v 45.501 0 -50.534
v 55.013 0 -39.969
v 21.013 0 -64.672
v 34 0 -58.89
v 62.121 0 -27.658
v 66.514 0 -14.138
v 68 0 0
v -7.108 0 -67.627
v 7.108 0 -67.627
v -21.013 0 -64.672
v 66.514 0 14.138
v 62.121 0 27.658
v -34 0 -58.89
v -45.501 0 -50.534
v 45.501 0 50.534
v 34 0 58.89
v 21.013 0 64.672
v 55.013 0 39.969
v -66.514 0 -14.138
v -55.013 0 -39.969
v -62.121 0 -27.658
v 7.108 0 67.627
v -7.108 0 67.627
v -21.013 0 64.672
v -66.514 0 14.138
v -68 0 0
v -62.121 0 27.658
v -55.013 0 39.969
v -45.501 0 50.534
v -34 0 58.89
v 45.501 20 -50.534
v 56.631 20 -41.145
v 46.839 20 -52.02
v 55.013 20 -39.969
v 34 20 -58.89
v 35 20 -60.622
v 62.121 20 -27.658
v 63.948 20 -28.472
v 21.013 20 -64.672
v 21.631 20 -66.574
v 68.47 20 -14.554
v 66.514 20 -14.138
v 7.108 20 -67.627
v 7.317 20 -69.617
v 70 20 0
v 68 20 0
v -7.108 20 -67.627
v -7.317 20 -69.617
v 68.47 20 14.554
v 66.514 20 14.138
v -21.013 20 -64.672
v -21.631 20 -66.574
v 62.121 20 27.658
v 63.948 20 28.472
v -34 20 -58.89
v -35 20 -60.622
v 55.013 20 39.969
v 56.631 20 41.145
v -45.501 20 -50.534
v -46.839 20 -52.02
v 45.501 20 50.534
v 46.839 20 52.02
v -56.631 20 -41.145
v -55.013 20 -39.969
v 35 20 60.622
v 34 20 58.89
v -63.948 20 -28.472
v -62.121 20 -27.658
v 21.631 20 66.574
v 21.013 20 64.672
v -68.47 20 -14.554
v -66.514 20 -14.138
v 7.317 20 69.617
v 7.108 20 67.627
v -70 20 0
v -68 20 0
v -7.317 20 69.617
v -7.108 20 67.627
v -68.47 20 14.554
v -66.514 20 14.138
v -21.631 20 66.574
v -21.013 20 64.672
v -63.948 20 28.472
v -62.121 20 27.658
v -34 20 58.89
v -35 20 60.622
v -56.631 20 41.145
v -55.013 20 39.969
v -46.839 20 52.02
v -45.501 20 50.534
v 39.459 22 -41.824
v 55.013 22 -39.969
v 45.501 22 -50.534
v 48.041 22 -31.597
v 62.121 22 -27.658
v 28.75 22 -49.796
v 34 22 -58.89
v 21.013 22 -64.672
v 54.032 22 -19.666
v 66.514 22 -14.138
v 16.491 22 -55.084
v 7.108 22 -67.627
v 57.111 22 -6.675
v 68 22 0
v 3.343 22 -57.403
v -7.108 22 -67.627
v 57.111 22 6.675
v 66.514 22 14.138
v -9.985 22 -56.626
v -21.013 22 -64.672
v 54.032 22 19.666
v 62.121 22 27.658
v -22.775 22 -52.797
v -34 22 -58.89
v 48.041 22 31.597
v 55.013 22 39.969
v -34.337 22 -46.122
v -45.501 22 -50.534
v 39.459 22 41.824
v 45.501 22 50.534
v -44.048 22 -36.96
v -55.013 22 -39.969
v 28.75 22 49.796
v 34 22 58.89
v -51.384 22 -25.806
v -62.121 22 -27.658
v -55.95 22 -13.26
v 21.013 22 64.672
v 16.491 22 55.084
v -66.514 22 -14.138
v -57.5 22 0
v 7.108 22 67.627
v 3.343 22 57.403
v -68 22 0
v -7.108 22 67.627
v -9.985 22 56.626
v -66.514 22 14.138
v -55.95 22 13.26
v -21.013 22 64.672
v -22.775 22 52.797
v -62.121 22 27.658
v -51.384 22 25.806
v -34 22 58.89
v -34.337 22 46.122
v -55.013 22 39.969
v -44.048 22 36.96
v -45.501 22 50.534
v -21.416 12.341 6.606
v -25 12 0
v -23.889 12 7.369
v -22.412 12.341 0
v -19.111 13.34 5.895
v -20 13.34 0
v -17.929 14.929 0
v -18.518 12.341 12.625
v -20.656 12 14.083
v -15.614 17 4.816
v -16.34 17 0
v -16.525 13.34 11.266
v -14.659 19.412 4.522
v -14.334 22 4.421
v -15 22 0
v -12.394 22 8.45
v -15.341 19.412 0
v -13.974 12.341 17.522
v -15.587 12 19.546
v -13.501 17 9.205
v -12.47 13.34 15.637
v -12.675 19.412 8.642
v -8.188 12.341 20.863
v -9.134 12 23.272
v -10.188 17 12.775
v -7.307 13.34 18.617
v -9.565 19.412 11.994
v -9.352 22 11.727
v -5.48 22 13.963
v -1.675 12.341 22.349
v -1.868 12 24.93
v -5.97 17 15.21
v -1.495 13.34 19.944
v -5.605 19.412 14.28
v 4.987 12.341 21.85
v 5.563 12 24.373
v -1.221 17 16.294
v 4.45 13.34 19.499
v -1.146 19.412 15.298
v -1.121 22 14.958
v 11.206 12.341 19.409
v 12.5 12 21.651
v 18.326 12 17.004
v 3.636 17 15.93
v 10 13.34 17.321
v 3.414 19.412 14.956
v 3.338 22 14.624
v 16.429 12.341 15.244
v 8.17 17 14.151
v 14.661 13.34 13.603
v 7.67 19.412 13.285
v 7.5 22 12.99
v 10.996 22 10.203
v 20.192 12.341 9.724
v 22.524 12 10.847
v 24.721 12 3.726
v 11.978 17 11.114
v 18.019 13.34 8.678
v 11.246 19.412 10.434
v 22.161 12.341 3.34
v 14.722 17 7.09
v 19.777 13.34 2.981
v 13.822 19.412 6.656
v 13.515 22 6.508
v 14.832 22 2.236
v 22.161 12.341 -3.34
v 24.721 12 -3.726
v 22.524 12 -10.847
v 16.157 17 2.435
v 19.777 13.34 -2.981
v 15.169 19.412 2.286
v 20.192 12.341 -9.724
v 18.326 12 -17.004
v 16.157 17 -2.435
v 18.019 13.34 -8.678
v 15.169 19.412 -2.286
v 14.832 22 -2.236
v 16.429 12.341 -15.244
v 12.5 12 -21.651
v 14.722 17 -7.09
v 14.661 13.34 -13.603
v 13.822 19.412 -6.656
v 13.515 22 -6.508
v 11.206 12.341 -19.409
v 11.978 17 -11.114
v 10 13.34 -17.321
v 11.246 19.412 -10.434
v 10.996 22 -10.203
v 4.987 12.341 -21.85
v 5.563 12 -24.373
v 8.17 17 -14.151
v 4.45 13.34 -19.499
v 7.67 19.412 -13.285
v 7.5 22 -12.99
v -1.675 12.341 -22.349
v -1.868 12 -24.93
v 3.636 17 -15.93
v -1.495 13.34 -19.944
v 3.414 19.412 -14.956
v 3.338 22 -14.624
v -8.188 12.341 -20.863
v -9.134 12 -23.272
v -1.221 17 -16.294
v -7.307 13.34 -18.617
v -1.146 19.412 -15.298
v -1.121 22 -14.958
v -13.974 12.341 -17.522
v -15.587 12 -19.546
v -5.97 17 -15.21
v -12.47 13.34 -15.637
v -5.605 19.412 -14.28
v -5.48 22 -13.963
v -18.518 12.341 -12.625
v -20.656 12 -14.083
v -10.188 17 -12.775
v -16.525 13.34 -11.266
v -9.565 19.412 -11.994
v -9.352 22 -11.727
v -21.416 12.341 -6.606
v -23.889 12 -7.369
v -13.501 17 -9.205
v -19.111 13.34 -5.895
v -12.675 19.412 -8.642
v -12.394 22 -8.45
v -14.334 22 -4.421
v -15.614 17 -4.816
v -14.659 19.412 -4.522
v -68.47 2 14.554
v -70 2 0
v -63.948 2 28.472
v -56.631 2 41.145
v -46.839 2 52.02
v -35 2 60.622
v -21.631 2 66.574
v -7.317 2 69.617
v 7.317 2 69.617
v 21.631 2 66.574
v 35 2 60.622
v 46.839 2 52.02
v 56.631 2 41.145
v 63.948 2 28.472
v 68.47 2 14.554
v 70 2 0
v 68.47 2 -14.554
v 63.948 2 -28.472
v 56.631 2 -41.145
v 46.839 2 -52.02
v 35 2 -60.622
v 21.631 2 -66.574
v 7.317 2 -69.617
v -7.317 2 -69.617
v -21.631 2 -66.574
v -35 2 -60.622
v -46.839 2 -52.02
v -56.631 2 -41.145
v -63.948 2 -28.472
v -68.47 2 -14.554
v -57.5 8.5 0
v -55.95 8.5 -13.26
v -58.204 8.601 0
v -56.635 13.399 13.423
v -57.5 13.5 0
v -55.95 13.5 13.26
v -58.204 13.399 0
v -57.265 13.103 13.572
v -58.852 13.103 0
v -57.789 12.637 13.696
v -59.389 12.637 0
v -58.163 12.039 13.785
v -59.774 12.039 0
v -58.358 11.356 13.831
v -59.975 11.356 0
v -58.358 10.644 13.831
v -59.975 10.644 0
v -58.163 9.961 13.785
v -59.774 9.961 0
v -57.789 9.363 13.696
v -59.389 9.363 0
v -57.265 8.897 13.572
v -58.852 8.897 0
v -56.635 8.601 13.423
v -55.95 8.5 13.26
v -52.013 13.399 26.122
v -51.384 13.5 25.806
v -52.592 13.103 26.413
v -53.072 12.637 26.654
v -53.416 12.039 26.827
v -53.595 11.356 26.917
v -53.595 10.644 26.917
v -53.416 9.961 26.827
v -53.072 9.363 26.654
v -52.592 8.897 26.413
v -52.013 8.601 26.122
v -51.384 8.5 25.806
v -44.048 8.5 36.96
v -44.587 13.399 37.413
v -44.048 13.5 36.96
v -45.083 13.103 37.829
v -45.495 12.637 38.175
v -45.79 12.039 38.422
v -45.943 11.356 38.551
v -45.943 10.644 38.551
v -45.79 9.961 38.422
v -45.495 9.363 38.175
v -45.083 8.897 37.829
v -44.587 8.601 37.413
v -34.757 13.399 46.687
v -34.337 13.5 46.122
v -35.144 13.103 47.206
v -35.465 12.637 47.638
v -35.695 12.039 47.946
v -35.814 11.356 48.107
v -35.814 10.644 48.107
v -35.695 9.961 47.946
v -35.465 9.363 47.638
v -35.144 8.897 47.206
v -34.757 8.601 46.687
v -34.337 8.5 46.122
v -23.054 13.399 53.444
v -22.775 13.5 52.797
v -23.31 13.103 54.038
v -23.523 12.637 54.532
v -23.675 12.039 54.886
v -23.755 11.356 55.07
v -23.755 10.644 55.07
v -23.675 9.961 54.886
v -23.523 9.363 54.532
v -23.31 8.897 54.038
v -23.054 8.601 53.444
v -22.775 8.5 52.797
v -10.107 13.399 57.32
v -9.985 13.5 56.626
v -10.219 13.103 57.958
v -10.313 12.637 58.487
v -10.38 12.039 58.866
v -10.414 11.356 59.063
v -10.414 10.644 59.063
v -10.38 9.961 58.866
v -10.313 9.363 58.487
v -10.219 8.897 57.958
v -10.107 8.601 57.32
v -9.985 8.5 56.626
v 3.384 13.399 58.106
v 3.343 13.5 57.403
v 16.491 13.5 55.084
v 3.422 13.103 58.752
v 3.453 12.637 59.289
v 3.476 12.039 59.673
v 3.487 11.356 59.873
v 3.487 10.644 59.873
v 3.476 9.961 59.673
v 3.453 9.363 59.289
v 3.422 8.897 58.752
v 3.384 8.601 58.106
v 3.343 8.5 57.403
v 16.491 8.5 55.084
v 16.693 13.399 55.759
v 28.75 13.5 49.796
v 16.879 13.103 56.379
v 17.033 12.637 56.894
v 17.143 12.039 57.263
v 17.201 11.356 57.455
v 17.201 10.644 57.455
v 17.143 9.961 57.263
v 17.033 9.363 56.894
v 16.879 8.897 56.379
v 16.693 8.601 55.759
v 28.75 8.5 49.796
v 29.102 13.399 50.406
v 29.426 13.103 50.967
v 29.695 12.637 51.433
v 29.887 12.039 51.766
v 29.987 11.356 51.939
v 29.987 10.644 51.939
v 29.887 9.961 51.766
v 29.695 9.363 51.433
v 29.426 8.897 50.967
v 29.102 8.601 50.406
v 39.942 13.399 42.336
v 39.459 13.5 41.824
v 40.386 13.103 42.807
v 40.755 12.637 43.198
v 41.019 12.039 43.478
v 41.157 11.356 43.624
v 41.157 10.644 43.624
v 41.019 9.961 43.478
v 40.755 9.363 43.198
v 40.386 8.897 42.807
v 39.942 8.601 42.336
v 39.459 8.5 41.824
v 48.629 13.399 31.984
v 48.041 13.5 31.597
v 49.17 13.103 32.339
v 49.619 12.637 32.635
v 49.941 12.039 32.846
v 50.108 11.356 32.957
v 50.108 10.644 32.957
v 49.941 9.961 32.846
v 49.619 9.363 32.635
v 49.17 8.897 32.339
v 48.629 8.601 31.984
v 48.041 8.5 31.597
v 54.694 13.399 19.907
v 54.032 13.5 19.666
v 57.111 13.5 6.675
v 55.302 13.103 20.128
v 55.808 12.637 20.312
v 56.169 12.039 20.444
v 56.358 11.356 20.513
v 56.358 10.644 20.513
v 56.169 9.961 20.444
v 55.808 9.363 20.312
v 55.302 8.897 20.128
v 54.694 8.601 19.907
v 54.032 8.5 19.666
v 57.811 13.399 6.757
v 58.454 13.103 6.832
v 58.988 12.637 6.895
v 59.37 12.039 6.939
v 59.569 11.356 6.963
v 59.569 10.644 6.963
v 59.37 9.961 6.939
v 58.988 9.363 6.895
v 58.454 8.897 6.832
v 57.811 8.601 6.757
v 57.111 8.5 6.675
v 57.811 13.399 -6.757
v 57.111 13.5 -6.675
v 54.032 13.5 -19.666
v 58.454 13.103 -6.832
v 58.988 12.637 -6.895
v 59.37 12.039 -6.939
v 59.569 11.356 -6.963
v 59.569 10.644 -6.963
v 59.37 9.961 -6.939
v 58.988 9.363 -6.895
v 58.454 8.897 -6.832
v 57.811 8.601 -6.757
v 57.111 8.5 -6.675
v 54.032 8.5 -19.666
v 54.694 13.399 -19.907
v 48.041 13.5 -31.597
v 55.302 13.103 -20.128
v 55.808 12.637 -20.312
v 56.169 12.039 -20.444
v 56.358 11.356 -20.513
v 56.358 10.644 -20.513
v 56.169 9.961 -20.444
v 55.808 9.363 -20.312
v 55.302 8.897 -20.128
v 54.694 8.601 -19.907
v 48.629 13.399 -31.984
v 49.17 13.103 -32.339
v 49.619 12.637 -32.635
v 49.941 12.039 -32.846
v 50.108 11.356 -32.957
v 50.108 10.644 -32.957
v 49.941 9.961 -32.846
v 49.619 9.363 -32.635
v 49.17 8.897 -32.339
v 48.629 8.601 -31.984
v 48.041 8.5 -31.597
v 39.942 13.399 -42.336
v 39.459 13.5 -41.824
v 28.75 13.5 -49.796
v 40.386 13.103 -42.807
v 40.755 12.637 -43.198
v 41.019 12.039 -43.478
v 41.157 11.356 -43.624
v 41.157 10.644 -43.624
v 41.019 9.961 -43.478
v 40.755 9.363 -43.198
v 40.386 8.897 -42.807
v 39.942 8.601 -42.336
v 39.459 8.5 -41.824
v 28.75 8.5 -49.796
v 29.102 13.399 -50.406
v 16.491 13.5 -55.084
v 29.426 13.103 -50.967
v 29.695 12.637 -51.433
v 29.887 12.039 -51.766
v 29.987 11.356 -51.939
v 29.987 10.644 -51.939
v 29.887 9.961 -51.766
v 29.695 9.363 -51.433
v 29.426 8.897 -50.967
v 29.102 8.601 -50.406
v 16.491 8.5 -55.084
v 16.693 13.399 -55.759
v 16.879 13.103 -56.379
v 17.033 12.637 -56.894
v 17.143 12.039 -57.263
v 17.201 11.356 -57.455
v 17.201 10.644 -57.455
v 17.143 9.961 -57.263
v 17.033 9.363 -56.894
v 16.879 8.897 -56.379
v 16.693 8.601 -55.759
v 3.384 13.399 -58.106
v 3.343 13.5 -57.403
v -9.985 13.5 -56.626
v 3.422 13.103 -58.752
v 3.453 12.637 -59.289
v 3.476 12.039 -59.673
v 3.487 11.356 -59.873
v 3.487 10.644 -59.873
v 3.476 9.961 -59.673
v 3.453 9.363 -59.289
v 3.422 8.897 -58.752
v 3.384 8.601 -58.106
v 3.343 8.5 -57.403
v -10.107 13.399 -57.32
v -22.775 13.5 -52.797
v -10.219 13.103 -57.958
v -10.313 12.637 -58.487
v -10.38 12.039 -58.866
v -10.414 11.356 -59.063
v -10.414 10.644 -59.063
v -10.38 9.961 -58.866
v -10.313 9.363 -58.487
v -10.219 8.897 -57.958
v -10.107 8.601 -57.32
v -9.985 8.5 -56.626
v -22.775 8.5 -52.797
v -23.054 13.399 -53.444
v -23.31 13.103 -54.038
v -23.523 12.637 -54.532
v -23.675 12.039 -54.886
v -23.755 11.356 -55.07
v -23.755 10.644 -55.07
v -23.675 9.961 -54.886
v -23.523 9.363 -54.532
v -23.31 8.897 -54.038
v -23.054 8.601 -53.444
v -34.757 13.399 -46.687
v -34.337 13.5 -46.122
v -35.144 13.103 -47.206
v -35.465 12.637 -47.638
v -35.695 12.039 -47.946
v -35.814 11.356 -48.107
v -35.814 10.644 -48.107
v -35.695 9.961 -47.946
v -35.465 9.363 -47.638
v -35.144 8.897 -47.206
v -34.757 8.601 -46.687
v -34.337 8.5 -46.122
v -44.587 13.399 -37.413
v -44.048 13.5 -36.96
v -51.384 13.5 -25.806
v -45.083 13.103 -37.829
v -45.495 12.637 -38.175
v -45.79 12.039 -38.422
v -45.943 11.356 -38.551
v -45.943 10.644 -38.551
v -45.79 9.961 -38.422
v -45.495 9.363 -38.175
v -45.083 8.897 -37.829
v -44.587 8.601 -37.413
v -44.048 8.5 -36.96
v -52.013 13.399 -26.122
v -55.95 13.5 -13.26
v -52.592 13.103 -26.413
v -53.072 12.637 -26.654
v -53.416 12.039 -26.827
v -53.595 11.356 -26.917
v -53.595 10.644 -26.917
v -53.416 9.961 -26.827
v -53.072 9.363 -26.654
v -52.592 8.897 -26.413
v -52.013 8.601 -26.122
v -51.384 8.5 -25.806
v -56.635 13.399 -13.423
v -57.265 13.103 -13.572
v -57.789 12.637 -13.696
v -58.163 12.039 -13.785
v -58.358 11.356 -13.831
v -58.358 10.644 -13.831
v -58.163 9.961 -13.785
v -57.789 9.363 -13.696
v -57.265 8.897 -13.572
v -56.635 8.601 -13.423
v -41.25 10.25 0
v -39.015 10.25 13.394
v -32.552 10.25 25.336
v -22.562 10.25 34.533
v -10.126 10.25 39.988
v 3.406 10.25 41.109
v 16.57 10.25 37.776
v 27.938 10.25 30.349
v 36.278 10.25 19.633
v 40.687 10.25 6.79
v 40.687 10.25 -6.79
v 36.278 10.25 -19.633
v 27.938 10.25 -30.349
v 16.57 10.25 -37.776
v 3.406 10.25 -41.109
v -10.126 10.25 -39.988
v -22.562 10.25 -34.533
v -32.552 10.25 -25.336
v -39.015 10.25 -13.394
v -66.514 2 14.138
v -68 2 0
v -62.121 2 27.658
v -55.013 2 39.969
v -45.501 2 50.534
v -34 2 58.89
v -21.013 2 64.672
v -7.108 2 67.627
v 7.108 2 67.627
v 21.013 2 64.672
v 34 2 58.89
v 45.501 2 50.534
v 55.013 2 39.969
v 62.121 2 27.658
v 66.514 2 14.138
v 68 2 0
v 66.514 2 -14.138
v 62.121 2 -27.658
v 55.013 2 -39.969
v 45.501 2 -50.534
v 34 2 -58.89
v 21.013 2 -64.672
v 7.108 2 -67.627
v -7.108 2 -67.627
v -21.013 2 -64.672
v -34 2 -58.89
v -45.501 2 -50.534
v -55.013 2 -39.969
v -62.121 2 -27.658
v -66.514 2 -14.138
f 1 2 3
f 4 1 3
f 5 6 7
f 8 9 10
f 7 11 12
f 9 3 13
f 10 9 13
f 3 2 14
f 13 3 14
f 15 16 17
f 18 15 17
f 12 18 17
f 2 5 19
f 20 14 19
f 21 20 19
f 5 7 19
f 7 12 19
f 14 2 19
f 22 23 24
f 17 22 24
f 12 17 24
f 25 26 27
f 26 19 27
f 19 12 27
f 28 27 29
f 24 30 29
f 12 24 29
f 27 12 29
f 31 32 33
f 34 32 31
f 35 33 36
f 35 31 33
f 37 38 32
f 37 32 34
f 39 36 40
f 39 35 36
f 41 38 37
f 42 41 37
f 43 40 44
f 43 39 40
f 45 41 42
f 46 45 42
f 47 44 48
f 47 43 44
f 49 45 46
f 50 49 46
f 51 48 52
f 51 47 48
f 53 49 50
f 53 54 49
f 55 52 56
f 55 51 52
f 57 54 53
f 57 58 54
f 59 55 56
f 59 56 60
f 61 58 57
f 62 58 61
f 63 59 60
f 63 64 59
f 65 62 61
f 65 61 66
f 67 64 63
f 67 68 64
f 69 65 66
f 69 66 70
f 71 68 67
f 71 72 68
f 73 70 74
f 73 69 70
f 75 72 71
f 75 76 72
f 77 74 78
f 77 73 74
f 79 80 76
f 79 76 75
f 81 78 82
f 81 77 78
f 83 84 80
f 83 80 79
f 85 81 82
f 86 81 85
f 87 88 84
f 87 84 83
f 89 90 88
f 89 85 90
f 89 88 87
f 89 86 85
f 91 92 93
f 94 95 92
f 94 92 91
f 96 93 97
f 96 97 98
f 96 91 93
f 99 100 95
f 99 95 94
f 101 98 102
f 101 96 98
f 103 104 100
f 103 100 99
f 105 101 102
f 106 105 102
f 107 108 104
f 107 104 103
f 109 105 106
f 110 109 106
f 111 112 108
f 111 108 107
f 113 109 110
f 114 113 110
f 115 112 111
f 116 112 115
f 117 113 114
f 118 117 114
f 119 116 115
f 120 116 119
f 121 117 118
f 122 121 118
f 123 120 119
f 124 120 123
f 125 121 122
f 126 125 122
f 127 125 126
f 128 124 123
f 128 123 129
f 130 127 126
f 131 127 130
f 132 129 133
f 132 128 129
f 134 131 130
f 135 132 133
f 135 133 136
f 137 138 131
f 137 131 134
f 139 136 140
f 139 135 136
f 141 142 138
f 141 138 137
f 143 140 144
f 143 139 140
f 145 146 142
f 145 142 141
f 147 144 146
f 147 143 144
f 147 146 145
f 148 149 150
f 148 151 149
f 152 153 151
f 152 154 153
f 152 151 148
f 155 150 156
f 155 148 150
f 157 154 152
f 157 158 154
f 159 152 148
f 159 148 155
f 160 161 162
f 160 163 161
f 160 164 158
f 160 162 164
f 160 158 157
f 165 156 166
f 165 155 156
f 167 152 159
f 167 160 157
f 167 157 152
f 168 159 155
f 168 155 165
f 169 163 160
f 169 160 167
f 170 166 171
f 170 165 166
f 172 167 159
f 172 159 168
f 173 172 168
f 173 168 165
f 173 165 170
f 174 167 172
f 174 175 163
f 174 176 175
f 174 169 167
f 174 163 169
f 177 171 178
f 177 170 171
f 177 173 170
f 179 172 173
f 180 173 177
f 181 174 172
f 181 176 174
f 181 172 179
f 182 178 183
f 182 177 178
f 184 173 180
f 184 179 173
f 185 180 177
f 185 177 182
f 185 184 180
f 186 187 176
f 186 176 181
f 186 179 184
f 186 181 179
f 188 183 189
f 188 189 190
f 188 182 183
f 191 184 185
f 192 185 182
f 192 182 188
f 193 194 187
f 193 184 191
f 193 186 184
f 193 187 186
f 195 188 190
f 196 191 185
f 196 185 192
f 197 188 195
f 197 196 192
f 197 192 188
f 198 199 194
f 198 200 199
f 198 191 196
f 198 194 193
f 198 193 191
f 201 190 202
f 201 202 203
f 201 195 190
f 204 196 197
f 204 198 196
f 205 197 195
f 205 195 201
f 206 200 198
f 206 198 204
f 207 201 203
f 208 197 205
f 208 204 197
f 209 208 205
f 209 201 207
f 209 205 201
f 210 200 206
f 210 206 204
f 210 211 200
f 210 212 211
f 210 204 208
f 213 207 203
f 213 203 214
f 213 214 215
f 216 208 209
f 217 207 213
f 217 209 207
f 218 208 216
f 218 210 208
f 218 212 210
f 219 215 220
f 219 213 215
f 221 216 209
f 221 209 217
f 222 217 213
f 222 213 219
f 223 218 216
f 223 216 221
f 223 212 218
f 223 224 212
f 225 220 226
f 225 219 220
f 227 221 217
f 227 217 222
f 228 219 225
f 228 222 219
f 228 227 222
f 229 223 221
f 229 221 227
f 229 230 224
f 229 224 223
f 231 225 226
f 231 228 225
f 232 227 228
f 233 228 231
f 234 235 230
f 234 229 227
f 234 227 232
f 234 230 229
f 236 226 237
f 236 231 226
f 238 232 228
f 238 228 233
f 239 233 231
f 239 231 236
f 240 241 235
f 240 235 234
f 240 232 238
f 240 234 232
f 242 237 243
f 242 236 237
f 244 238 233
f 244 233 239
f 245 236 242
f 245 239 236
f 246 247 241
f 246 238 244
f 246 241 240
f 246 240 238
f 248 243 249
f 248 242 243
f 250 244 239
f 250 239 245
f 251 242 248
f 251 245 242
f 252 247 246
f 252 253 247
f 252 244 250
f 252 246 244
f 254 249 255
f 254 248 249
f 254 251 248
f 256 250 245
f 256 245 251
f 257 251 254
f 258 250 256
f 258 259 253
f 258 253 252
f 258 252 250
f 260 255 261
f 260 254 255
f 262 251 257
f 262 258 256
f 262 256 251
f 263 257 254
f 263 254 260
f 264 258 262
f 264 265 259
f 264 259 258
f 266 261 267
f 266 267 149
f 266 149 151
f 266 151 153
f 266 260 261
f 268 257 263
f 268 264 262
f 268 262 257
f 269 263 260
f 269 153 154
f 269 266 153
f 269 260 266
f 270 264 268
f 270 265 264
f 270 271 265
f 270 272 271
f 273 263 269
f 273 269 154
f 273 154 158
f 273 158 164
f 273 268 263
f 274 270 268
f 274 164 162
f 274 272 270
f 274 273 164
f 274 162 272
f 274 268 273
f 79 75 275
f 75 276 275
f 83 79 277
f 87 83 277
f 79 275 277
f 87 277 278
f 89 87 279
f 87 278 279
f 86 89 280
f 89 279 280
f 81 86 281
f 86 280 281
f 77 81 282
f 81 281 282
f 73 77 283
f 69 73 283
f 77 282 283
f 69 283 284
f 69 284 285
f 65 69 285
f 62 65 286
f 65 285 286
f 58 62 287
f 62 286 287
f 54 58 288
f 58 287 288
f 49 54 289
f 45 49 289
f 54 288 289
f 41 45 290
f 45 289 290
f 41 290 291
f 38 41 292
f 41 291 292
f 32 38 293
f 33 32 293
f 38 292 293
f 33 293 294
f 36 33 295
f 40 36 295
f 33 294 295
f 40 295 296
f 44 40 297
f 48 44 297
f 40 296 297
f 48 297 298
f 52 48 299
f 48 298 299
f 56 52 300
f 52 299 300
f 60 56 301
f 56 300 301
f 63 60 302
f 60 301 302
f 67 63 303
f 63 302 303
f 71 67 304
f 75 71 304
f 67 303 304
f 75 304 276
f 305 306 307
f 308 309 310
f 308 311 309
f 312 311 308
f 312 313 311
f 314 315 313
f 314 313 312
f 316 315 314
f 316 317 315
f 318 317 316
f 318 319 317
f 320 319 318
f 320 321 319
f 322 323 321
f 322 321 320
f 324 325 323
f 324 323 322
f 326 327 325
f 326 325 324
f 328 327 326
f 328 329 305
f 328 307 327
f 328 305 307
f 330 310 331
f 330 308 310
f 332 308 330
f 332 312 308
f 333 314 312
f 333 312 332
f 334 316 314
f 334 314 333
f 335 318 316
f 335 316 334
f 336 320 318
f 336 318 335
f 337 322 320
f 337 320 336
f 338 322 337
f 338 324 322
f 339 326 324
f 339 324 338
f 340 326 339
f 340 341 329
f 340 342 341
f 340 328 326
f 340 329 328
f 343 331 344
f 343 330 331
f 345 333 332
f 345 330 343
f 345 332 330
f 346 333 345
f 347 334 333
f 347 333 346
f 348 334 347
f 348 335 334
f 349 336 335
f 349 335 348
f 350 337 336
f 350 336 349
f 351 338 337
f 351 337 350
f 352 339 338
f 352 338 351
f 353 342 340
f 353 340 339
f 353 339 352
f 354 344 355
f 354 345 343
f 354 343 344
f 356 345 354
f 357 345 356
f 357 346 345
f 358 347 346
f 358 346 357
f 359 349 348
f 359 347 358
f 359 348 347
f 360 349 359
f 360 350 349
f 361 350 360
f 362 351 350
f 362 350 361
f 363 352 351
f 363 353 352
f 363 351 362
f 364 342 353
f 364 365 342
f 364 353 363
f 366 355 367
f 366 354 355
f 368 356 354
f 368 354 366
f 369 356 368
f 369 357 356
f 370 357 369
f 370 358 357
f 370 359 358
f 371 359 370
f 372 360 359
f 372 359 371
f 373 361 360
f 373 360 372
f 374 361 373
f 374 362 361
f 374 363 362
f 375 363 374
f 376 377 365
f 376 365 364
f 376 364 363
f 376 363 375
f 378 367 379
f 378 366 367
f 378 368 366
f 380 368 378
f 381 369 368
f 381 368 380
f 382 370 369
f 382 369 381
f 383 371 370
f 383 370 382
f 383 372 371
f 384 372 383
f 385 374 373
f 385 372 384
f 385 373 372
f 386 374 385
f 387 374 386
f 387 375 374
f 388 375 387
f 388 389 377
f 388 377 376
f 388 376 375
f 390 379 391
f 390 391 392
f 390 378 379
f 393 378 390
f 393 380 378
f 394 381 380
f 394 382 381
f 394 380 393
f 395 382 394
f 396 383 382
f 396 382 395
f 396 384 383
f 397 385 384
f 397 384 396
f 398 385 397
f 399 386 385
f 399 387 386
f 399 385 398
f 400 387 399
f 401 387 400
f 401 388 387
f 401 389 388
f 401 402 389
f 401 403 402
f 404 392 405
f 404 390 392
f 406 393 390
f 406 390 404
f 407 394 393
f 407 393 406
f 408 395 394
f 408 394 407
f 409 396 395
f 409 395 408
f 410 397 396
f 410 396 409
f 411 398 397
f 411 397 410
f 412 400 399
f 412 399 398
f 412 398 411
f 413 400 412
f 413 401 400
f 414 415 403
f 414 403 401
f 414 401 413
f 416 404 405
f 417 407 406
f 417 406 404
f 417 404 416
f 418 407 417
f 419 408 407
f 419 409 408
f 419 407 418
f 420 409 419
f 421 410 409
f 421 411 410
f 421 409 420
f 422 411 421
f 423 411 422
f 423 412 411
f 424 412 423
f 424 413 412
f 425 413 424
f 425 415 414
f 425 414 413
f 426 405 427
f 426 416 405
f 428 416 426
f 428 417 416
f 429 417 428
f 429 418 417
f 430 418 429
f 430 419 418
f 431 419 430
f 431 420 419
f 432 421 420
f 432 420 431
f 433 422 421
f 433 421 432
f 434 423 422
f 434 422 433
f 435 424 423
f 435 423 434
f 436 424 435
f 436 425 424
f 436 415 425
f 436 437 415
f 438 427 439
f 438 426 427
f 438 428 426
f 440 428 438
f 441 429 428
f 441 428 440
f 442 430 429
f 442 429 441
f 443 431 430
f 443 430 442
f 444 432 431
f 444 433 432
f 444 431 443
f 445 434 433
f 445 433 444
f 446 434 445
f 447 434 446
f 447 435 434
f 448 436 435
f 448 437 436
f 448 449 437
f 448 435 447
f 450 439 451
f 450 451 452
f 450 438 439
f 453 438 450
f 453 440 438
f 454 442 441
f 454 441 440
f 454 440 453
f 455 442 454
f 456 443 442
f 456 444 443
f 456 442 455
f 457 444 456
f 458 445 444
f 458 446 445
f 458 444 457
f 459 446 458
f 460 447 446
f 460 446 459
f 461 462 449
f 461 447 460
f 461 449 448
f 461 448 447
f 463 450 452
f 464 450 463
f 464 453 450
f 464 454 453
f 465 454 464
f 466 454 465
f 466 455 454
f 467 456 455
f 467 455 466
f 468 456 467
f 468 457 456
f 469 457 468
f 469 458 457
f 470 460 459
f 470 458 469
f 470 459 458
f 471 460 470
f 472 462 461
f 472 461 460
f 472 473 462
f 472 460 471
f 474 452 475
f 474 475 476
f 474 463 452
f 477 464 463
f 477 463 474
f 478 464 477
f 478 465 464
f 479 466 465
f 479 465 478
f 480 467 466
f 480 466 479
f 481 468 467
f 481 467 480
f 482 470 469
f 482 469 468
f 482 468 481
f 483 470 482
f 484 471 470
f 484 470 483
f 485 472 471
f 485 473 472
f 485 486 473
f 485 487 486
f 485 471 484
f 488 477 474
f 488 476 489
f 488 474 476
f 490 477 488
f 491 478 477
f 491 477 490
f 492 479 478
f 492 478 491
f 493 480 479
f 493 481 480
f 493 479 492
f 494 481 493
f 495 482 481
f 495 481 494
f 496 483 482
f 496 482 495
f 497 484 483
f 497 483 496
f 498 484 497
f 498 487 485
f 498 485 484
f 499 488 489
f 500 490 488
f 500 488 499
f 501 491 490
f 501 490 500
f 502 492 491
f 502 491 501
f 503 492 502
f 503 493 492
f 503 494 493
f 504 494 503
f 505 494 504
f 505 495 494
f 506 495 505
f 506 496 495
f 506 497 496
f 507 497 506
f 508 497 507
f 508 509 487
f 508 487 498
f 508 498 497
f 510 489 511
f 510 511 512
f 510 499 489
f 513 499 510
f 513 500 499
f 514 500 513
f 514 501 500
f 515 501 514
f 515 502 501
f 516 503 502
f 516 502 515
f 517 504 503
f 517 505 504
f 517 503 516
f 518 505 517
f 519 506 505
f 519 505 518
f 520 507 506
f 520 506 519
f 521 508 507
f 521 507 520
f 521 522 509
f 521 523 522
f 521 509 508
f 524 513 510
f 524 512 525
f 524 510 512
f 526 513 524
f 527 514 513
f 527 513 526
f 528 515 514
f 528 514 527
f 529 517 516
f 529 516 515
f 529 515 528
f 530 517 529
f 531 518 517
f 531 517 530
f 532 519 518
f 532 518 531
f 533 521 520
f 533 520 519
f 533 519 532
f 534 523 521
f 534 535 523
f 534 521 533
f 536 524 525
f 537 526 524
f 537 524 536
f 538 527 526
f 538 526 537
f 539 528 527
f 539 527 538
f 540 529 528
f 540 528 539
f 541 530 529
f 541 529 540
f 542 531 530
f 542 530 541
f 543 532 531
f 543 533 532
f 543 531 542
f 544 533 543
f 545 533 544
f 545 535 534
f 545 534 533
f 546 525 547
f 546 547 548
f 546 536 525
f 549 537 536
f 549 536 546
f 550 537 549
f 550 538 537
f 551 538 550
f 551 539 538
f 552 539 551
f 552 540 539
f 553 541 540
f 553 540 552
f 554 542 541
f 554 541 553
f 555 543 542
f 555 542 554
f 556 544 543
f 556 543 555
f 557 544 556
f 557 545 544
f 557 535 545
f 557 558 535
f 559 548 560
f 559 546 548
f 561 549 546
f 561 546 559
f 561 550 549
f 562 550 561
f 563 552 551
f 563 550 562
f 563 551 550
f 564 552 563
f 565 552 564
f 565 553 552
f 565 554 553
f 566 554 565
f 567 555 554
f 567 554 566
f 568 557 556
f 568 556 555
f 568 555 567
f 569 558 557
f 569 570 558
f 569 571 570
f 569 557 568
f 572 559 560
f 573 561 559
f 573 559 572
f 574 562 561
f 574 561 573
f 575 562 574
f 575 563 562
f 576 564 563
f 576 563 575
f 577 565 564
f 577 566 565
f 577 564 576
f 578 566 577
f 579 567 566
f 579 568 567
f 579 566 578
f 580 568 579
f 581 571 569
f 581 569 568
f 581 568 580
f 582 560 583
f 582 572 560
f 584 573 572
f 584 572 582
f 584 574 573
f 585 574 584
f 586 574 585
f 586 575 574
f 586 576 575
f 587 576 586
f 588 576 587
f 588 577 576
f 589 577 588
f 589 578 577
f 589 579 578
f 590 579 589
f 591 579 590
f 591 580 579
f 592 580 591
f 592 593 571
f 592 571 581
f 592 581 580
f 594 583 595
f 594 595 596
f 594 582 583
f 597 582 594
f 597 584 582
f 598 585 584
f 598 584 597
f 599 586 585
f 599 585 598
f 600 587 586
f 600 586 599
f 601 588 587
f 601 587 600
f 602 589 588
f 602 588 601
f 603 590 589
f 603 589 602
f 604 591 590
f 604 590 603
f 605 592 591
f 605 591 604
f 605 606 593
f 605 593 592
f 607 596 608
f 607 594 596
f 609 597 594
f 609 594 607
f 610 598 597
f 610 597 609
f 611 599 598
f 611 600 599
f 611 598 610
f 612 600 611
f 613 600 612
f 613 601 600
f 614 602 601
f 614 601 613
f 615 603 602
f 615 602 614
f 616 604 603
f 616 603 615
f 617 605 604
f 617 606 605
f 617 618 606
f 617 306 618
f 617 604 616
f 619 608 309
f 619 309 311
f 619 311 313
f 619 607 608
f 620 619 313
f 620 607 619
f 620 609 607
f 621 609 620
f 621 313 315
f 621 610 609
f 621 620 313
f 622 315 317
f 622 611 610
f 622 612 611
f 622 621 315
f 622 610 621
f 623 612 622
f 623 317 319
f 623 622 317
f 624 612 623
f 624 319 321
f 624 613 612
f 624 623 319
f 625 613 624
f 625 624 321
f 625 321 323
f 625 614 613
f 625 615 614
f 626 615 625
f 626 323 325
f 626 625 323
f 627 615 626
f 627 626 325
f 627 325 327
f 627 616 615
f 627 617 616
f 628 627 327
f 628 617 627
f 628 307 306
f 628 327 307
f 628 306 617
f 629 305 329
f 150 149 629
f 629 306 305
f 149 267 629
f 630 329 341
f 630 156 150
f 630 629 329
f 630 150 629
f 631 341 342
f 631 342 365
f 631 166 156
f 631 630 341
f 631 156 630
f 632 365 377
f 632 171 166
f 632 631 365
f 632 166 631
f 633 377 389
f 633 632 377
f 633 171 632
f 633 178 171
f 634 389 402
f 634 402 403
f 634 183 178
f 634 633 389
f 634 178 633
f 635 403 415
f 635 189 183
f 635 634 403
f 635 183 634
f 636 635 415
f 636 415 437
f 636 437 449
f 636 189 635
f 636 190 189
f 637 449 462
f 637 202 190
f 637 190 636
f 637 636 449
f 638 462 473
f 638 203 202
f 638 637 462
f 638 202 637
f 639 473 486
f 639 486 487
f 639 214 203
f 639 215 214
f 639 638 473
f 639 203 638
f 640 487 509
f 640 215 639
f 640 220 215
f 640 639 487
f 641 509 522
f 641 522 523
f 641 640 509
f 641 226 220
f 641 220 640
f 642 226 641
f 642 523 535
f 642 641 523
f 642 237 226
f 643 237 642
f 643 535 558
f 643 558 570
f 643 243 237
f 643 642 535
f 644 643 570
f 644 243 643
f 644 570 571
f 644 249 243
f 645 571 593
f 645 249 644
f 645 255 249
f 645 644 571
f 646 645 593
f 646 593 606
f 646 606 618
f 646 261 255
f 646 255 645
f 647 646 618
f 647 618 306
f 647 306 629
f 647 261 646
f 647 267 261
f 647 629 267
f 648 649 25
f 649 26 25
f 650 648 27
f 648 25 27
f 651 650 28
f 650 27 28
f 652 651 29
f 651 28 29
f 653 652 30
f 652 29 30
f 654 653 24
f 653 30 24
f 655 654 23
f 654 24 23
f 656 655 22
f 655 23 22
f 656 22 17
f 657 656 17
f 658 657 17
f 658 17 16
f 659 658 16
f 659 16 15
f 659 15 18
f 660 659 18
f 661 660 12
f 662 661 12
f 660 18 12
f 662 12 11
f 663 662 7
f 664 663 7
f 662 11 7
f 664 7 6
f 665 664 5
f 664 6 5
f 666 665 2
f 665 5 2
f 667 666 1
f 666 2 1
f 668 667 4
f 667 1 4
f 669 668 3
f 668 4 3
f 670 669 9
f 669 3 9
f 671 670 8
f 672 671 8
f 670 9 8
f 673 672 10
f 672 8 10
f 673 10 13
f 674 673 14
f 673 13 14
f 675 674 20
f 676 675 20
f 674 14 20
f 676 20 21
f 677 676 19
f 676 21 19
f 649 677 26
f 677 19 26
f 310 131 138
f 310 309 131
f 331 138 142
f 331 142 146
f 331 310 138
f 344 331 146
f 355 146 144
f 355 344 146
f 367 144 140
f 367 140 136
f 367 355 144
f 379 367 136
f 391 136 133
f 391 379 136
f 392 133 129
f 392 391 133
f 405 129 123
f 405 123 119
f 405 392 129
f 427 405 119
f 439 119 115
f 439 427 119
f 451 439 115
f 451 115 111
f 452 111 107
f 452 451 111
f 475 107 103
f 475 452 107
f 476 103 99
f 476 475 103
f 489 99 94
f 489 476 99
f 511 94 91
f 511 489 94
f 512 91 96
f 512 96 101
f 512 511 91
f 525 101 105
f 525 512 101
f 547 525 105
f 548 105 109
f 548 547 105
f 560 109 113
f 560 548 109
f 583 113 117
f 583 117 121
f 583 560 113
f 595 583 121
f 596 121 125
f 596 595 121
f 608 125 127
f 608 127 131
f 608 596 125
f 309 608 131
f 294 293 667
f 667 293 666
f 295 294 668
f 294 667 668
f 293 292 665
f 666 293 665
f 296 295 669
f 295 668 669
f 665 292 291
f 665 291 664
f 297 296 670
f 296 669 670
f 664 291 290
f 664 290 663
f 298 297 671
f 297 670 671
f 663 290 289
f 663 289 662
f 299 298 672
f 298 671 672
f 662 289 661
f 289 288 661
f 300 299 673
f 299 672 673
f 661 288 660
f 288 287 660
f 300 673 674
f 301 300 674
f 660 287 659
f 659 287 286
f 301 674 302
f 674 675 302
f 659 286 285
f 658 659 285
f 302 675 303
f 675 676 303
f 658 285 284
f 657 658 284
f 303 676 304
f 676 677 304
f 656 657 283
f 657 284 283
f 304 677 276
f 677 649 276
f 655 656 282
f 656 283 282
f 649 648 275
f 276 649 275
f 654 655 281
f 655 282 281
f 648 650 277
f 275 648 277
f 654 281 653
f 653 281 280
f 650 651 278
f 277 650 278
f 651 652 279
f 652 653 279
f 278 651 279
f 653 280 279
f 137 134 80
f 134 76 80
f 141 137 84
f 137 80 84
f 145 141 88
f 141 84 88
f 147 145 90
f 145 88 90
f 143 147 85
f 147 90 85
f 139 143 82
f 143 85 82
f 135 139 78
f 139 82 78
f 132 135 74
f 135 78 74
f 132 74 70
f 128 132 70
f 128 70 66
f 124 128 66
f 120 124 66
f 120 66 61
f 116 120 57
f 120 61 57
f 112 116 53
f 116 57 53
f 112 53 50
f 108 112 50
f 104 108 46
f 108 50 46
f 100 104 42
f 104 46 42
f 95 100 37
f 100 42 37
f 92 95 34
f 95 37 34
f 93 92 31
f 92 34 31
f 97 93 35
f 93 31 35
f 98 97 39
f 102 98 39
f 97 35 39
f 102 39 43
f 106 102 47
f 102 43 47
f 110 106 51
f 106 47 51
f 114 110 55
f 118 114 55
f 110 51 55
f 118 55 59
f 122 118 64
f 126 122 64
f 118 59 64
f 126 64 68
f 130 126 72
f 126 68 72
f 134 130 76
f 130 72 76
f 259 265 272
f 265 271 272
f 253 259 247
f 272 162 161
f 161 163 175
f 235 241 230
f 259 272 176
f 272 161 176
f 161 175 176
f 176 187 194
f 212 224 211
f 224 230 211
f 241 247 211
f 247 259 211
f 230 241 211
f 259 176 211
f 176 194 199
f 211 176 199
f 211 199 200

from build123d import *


with BuildPart() as part:
    # Sketch → Revolution (revolve)
    with BuildSketch(Plane.XY):
        with BuildLine():
            Line((-68, 22), (-68, 20))
            Line((-70, 20), (-68, 20))
            Line((-70, 20), (-70, 2))
            Line((-70, 2), (-68, 2))
            Line((-68, 2), (-68, 0))
            Line((-68, 0), (0, 0))
            Line((0, 0), (0, 22))
            Line((0, 22), (-15, 22))
            ThreePointArc((-25, 12), (-17.928932, 14.928932), (-15, 22))
            Line((-57.5, 8.5), (-25, 12))
            ThreePointArc((-57.5, 13.5), (-60, 11), (-57.5, 8.5))
            Line((-57.5, 22), (-57.5, 13.5))
            Line((-68, 22), (-57.5, 22))
        make_face()
    revolve(axis=Axis((0, 0, 0), (0, 1, 0)))


solid = part.part
